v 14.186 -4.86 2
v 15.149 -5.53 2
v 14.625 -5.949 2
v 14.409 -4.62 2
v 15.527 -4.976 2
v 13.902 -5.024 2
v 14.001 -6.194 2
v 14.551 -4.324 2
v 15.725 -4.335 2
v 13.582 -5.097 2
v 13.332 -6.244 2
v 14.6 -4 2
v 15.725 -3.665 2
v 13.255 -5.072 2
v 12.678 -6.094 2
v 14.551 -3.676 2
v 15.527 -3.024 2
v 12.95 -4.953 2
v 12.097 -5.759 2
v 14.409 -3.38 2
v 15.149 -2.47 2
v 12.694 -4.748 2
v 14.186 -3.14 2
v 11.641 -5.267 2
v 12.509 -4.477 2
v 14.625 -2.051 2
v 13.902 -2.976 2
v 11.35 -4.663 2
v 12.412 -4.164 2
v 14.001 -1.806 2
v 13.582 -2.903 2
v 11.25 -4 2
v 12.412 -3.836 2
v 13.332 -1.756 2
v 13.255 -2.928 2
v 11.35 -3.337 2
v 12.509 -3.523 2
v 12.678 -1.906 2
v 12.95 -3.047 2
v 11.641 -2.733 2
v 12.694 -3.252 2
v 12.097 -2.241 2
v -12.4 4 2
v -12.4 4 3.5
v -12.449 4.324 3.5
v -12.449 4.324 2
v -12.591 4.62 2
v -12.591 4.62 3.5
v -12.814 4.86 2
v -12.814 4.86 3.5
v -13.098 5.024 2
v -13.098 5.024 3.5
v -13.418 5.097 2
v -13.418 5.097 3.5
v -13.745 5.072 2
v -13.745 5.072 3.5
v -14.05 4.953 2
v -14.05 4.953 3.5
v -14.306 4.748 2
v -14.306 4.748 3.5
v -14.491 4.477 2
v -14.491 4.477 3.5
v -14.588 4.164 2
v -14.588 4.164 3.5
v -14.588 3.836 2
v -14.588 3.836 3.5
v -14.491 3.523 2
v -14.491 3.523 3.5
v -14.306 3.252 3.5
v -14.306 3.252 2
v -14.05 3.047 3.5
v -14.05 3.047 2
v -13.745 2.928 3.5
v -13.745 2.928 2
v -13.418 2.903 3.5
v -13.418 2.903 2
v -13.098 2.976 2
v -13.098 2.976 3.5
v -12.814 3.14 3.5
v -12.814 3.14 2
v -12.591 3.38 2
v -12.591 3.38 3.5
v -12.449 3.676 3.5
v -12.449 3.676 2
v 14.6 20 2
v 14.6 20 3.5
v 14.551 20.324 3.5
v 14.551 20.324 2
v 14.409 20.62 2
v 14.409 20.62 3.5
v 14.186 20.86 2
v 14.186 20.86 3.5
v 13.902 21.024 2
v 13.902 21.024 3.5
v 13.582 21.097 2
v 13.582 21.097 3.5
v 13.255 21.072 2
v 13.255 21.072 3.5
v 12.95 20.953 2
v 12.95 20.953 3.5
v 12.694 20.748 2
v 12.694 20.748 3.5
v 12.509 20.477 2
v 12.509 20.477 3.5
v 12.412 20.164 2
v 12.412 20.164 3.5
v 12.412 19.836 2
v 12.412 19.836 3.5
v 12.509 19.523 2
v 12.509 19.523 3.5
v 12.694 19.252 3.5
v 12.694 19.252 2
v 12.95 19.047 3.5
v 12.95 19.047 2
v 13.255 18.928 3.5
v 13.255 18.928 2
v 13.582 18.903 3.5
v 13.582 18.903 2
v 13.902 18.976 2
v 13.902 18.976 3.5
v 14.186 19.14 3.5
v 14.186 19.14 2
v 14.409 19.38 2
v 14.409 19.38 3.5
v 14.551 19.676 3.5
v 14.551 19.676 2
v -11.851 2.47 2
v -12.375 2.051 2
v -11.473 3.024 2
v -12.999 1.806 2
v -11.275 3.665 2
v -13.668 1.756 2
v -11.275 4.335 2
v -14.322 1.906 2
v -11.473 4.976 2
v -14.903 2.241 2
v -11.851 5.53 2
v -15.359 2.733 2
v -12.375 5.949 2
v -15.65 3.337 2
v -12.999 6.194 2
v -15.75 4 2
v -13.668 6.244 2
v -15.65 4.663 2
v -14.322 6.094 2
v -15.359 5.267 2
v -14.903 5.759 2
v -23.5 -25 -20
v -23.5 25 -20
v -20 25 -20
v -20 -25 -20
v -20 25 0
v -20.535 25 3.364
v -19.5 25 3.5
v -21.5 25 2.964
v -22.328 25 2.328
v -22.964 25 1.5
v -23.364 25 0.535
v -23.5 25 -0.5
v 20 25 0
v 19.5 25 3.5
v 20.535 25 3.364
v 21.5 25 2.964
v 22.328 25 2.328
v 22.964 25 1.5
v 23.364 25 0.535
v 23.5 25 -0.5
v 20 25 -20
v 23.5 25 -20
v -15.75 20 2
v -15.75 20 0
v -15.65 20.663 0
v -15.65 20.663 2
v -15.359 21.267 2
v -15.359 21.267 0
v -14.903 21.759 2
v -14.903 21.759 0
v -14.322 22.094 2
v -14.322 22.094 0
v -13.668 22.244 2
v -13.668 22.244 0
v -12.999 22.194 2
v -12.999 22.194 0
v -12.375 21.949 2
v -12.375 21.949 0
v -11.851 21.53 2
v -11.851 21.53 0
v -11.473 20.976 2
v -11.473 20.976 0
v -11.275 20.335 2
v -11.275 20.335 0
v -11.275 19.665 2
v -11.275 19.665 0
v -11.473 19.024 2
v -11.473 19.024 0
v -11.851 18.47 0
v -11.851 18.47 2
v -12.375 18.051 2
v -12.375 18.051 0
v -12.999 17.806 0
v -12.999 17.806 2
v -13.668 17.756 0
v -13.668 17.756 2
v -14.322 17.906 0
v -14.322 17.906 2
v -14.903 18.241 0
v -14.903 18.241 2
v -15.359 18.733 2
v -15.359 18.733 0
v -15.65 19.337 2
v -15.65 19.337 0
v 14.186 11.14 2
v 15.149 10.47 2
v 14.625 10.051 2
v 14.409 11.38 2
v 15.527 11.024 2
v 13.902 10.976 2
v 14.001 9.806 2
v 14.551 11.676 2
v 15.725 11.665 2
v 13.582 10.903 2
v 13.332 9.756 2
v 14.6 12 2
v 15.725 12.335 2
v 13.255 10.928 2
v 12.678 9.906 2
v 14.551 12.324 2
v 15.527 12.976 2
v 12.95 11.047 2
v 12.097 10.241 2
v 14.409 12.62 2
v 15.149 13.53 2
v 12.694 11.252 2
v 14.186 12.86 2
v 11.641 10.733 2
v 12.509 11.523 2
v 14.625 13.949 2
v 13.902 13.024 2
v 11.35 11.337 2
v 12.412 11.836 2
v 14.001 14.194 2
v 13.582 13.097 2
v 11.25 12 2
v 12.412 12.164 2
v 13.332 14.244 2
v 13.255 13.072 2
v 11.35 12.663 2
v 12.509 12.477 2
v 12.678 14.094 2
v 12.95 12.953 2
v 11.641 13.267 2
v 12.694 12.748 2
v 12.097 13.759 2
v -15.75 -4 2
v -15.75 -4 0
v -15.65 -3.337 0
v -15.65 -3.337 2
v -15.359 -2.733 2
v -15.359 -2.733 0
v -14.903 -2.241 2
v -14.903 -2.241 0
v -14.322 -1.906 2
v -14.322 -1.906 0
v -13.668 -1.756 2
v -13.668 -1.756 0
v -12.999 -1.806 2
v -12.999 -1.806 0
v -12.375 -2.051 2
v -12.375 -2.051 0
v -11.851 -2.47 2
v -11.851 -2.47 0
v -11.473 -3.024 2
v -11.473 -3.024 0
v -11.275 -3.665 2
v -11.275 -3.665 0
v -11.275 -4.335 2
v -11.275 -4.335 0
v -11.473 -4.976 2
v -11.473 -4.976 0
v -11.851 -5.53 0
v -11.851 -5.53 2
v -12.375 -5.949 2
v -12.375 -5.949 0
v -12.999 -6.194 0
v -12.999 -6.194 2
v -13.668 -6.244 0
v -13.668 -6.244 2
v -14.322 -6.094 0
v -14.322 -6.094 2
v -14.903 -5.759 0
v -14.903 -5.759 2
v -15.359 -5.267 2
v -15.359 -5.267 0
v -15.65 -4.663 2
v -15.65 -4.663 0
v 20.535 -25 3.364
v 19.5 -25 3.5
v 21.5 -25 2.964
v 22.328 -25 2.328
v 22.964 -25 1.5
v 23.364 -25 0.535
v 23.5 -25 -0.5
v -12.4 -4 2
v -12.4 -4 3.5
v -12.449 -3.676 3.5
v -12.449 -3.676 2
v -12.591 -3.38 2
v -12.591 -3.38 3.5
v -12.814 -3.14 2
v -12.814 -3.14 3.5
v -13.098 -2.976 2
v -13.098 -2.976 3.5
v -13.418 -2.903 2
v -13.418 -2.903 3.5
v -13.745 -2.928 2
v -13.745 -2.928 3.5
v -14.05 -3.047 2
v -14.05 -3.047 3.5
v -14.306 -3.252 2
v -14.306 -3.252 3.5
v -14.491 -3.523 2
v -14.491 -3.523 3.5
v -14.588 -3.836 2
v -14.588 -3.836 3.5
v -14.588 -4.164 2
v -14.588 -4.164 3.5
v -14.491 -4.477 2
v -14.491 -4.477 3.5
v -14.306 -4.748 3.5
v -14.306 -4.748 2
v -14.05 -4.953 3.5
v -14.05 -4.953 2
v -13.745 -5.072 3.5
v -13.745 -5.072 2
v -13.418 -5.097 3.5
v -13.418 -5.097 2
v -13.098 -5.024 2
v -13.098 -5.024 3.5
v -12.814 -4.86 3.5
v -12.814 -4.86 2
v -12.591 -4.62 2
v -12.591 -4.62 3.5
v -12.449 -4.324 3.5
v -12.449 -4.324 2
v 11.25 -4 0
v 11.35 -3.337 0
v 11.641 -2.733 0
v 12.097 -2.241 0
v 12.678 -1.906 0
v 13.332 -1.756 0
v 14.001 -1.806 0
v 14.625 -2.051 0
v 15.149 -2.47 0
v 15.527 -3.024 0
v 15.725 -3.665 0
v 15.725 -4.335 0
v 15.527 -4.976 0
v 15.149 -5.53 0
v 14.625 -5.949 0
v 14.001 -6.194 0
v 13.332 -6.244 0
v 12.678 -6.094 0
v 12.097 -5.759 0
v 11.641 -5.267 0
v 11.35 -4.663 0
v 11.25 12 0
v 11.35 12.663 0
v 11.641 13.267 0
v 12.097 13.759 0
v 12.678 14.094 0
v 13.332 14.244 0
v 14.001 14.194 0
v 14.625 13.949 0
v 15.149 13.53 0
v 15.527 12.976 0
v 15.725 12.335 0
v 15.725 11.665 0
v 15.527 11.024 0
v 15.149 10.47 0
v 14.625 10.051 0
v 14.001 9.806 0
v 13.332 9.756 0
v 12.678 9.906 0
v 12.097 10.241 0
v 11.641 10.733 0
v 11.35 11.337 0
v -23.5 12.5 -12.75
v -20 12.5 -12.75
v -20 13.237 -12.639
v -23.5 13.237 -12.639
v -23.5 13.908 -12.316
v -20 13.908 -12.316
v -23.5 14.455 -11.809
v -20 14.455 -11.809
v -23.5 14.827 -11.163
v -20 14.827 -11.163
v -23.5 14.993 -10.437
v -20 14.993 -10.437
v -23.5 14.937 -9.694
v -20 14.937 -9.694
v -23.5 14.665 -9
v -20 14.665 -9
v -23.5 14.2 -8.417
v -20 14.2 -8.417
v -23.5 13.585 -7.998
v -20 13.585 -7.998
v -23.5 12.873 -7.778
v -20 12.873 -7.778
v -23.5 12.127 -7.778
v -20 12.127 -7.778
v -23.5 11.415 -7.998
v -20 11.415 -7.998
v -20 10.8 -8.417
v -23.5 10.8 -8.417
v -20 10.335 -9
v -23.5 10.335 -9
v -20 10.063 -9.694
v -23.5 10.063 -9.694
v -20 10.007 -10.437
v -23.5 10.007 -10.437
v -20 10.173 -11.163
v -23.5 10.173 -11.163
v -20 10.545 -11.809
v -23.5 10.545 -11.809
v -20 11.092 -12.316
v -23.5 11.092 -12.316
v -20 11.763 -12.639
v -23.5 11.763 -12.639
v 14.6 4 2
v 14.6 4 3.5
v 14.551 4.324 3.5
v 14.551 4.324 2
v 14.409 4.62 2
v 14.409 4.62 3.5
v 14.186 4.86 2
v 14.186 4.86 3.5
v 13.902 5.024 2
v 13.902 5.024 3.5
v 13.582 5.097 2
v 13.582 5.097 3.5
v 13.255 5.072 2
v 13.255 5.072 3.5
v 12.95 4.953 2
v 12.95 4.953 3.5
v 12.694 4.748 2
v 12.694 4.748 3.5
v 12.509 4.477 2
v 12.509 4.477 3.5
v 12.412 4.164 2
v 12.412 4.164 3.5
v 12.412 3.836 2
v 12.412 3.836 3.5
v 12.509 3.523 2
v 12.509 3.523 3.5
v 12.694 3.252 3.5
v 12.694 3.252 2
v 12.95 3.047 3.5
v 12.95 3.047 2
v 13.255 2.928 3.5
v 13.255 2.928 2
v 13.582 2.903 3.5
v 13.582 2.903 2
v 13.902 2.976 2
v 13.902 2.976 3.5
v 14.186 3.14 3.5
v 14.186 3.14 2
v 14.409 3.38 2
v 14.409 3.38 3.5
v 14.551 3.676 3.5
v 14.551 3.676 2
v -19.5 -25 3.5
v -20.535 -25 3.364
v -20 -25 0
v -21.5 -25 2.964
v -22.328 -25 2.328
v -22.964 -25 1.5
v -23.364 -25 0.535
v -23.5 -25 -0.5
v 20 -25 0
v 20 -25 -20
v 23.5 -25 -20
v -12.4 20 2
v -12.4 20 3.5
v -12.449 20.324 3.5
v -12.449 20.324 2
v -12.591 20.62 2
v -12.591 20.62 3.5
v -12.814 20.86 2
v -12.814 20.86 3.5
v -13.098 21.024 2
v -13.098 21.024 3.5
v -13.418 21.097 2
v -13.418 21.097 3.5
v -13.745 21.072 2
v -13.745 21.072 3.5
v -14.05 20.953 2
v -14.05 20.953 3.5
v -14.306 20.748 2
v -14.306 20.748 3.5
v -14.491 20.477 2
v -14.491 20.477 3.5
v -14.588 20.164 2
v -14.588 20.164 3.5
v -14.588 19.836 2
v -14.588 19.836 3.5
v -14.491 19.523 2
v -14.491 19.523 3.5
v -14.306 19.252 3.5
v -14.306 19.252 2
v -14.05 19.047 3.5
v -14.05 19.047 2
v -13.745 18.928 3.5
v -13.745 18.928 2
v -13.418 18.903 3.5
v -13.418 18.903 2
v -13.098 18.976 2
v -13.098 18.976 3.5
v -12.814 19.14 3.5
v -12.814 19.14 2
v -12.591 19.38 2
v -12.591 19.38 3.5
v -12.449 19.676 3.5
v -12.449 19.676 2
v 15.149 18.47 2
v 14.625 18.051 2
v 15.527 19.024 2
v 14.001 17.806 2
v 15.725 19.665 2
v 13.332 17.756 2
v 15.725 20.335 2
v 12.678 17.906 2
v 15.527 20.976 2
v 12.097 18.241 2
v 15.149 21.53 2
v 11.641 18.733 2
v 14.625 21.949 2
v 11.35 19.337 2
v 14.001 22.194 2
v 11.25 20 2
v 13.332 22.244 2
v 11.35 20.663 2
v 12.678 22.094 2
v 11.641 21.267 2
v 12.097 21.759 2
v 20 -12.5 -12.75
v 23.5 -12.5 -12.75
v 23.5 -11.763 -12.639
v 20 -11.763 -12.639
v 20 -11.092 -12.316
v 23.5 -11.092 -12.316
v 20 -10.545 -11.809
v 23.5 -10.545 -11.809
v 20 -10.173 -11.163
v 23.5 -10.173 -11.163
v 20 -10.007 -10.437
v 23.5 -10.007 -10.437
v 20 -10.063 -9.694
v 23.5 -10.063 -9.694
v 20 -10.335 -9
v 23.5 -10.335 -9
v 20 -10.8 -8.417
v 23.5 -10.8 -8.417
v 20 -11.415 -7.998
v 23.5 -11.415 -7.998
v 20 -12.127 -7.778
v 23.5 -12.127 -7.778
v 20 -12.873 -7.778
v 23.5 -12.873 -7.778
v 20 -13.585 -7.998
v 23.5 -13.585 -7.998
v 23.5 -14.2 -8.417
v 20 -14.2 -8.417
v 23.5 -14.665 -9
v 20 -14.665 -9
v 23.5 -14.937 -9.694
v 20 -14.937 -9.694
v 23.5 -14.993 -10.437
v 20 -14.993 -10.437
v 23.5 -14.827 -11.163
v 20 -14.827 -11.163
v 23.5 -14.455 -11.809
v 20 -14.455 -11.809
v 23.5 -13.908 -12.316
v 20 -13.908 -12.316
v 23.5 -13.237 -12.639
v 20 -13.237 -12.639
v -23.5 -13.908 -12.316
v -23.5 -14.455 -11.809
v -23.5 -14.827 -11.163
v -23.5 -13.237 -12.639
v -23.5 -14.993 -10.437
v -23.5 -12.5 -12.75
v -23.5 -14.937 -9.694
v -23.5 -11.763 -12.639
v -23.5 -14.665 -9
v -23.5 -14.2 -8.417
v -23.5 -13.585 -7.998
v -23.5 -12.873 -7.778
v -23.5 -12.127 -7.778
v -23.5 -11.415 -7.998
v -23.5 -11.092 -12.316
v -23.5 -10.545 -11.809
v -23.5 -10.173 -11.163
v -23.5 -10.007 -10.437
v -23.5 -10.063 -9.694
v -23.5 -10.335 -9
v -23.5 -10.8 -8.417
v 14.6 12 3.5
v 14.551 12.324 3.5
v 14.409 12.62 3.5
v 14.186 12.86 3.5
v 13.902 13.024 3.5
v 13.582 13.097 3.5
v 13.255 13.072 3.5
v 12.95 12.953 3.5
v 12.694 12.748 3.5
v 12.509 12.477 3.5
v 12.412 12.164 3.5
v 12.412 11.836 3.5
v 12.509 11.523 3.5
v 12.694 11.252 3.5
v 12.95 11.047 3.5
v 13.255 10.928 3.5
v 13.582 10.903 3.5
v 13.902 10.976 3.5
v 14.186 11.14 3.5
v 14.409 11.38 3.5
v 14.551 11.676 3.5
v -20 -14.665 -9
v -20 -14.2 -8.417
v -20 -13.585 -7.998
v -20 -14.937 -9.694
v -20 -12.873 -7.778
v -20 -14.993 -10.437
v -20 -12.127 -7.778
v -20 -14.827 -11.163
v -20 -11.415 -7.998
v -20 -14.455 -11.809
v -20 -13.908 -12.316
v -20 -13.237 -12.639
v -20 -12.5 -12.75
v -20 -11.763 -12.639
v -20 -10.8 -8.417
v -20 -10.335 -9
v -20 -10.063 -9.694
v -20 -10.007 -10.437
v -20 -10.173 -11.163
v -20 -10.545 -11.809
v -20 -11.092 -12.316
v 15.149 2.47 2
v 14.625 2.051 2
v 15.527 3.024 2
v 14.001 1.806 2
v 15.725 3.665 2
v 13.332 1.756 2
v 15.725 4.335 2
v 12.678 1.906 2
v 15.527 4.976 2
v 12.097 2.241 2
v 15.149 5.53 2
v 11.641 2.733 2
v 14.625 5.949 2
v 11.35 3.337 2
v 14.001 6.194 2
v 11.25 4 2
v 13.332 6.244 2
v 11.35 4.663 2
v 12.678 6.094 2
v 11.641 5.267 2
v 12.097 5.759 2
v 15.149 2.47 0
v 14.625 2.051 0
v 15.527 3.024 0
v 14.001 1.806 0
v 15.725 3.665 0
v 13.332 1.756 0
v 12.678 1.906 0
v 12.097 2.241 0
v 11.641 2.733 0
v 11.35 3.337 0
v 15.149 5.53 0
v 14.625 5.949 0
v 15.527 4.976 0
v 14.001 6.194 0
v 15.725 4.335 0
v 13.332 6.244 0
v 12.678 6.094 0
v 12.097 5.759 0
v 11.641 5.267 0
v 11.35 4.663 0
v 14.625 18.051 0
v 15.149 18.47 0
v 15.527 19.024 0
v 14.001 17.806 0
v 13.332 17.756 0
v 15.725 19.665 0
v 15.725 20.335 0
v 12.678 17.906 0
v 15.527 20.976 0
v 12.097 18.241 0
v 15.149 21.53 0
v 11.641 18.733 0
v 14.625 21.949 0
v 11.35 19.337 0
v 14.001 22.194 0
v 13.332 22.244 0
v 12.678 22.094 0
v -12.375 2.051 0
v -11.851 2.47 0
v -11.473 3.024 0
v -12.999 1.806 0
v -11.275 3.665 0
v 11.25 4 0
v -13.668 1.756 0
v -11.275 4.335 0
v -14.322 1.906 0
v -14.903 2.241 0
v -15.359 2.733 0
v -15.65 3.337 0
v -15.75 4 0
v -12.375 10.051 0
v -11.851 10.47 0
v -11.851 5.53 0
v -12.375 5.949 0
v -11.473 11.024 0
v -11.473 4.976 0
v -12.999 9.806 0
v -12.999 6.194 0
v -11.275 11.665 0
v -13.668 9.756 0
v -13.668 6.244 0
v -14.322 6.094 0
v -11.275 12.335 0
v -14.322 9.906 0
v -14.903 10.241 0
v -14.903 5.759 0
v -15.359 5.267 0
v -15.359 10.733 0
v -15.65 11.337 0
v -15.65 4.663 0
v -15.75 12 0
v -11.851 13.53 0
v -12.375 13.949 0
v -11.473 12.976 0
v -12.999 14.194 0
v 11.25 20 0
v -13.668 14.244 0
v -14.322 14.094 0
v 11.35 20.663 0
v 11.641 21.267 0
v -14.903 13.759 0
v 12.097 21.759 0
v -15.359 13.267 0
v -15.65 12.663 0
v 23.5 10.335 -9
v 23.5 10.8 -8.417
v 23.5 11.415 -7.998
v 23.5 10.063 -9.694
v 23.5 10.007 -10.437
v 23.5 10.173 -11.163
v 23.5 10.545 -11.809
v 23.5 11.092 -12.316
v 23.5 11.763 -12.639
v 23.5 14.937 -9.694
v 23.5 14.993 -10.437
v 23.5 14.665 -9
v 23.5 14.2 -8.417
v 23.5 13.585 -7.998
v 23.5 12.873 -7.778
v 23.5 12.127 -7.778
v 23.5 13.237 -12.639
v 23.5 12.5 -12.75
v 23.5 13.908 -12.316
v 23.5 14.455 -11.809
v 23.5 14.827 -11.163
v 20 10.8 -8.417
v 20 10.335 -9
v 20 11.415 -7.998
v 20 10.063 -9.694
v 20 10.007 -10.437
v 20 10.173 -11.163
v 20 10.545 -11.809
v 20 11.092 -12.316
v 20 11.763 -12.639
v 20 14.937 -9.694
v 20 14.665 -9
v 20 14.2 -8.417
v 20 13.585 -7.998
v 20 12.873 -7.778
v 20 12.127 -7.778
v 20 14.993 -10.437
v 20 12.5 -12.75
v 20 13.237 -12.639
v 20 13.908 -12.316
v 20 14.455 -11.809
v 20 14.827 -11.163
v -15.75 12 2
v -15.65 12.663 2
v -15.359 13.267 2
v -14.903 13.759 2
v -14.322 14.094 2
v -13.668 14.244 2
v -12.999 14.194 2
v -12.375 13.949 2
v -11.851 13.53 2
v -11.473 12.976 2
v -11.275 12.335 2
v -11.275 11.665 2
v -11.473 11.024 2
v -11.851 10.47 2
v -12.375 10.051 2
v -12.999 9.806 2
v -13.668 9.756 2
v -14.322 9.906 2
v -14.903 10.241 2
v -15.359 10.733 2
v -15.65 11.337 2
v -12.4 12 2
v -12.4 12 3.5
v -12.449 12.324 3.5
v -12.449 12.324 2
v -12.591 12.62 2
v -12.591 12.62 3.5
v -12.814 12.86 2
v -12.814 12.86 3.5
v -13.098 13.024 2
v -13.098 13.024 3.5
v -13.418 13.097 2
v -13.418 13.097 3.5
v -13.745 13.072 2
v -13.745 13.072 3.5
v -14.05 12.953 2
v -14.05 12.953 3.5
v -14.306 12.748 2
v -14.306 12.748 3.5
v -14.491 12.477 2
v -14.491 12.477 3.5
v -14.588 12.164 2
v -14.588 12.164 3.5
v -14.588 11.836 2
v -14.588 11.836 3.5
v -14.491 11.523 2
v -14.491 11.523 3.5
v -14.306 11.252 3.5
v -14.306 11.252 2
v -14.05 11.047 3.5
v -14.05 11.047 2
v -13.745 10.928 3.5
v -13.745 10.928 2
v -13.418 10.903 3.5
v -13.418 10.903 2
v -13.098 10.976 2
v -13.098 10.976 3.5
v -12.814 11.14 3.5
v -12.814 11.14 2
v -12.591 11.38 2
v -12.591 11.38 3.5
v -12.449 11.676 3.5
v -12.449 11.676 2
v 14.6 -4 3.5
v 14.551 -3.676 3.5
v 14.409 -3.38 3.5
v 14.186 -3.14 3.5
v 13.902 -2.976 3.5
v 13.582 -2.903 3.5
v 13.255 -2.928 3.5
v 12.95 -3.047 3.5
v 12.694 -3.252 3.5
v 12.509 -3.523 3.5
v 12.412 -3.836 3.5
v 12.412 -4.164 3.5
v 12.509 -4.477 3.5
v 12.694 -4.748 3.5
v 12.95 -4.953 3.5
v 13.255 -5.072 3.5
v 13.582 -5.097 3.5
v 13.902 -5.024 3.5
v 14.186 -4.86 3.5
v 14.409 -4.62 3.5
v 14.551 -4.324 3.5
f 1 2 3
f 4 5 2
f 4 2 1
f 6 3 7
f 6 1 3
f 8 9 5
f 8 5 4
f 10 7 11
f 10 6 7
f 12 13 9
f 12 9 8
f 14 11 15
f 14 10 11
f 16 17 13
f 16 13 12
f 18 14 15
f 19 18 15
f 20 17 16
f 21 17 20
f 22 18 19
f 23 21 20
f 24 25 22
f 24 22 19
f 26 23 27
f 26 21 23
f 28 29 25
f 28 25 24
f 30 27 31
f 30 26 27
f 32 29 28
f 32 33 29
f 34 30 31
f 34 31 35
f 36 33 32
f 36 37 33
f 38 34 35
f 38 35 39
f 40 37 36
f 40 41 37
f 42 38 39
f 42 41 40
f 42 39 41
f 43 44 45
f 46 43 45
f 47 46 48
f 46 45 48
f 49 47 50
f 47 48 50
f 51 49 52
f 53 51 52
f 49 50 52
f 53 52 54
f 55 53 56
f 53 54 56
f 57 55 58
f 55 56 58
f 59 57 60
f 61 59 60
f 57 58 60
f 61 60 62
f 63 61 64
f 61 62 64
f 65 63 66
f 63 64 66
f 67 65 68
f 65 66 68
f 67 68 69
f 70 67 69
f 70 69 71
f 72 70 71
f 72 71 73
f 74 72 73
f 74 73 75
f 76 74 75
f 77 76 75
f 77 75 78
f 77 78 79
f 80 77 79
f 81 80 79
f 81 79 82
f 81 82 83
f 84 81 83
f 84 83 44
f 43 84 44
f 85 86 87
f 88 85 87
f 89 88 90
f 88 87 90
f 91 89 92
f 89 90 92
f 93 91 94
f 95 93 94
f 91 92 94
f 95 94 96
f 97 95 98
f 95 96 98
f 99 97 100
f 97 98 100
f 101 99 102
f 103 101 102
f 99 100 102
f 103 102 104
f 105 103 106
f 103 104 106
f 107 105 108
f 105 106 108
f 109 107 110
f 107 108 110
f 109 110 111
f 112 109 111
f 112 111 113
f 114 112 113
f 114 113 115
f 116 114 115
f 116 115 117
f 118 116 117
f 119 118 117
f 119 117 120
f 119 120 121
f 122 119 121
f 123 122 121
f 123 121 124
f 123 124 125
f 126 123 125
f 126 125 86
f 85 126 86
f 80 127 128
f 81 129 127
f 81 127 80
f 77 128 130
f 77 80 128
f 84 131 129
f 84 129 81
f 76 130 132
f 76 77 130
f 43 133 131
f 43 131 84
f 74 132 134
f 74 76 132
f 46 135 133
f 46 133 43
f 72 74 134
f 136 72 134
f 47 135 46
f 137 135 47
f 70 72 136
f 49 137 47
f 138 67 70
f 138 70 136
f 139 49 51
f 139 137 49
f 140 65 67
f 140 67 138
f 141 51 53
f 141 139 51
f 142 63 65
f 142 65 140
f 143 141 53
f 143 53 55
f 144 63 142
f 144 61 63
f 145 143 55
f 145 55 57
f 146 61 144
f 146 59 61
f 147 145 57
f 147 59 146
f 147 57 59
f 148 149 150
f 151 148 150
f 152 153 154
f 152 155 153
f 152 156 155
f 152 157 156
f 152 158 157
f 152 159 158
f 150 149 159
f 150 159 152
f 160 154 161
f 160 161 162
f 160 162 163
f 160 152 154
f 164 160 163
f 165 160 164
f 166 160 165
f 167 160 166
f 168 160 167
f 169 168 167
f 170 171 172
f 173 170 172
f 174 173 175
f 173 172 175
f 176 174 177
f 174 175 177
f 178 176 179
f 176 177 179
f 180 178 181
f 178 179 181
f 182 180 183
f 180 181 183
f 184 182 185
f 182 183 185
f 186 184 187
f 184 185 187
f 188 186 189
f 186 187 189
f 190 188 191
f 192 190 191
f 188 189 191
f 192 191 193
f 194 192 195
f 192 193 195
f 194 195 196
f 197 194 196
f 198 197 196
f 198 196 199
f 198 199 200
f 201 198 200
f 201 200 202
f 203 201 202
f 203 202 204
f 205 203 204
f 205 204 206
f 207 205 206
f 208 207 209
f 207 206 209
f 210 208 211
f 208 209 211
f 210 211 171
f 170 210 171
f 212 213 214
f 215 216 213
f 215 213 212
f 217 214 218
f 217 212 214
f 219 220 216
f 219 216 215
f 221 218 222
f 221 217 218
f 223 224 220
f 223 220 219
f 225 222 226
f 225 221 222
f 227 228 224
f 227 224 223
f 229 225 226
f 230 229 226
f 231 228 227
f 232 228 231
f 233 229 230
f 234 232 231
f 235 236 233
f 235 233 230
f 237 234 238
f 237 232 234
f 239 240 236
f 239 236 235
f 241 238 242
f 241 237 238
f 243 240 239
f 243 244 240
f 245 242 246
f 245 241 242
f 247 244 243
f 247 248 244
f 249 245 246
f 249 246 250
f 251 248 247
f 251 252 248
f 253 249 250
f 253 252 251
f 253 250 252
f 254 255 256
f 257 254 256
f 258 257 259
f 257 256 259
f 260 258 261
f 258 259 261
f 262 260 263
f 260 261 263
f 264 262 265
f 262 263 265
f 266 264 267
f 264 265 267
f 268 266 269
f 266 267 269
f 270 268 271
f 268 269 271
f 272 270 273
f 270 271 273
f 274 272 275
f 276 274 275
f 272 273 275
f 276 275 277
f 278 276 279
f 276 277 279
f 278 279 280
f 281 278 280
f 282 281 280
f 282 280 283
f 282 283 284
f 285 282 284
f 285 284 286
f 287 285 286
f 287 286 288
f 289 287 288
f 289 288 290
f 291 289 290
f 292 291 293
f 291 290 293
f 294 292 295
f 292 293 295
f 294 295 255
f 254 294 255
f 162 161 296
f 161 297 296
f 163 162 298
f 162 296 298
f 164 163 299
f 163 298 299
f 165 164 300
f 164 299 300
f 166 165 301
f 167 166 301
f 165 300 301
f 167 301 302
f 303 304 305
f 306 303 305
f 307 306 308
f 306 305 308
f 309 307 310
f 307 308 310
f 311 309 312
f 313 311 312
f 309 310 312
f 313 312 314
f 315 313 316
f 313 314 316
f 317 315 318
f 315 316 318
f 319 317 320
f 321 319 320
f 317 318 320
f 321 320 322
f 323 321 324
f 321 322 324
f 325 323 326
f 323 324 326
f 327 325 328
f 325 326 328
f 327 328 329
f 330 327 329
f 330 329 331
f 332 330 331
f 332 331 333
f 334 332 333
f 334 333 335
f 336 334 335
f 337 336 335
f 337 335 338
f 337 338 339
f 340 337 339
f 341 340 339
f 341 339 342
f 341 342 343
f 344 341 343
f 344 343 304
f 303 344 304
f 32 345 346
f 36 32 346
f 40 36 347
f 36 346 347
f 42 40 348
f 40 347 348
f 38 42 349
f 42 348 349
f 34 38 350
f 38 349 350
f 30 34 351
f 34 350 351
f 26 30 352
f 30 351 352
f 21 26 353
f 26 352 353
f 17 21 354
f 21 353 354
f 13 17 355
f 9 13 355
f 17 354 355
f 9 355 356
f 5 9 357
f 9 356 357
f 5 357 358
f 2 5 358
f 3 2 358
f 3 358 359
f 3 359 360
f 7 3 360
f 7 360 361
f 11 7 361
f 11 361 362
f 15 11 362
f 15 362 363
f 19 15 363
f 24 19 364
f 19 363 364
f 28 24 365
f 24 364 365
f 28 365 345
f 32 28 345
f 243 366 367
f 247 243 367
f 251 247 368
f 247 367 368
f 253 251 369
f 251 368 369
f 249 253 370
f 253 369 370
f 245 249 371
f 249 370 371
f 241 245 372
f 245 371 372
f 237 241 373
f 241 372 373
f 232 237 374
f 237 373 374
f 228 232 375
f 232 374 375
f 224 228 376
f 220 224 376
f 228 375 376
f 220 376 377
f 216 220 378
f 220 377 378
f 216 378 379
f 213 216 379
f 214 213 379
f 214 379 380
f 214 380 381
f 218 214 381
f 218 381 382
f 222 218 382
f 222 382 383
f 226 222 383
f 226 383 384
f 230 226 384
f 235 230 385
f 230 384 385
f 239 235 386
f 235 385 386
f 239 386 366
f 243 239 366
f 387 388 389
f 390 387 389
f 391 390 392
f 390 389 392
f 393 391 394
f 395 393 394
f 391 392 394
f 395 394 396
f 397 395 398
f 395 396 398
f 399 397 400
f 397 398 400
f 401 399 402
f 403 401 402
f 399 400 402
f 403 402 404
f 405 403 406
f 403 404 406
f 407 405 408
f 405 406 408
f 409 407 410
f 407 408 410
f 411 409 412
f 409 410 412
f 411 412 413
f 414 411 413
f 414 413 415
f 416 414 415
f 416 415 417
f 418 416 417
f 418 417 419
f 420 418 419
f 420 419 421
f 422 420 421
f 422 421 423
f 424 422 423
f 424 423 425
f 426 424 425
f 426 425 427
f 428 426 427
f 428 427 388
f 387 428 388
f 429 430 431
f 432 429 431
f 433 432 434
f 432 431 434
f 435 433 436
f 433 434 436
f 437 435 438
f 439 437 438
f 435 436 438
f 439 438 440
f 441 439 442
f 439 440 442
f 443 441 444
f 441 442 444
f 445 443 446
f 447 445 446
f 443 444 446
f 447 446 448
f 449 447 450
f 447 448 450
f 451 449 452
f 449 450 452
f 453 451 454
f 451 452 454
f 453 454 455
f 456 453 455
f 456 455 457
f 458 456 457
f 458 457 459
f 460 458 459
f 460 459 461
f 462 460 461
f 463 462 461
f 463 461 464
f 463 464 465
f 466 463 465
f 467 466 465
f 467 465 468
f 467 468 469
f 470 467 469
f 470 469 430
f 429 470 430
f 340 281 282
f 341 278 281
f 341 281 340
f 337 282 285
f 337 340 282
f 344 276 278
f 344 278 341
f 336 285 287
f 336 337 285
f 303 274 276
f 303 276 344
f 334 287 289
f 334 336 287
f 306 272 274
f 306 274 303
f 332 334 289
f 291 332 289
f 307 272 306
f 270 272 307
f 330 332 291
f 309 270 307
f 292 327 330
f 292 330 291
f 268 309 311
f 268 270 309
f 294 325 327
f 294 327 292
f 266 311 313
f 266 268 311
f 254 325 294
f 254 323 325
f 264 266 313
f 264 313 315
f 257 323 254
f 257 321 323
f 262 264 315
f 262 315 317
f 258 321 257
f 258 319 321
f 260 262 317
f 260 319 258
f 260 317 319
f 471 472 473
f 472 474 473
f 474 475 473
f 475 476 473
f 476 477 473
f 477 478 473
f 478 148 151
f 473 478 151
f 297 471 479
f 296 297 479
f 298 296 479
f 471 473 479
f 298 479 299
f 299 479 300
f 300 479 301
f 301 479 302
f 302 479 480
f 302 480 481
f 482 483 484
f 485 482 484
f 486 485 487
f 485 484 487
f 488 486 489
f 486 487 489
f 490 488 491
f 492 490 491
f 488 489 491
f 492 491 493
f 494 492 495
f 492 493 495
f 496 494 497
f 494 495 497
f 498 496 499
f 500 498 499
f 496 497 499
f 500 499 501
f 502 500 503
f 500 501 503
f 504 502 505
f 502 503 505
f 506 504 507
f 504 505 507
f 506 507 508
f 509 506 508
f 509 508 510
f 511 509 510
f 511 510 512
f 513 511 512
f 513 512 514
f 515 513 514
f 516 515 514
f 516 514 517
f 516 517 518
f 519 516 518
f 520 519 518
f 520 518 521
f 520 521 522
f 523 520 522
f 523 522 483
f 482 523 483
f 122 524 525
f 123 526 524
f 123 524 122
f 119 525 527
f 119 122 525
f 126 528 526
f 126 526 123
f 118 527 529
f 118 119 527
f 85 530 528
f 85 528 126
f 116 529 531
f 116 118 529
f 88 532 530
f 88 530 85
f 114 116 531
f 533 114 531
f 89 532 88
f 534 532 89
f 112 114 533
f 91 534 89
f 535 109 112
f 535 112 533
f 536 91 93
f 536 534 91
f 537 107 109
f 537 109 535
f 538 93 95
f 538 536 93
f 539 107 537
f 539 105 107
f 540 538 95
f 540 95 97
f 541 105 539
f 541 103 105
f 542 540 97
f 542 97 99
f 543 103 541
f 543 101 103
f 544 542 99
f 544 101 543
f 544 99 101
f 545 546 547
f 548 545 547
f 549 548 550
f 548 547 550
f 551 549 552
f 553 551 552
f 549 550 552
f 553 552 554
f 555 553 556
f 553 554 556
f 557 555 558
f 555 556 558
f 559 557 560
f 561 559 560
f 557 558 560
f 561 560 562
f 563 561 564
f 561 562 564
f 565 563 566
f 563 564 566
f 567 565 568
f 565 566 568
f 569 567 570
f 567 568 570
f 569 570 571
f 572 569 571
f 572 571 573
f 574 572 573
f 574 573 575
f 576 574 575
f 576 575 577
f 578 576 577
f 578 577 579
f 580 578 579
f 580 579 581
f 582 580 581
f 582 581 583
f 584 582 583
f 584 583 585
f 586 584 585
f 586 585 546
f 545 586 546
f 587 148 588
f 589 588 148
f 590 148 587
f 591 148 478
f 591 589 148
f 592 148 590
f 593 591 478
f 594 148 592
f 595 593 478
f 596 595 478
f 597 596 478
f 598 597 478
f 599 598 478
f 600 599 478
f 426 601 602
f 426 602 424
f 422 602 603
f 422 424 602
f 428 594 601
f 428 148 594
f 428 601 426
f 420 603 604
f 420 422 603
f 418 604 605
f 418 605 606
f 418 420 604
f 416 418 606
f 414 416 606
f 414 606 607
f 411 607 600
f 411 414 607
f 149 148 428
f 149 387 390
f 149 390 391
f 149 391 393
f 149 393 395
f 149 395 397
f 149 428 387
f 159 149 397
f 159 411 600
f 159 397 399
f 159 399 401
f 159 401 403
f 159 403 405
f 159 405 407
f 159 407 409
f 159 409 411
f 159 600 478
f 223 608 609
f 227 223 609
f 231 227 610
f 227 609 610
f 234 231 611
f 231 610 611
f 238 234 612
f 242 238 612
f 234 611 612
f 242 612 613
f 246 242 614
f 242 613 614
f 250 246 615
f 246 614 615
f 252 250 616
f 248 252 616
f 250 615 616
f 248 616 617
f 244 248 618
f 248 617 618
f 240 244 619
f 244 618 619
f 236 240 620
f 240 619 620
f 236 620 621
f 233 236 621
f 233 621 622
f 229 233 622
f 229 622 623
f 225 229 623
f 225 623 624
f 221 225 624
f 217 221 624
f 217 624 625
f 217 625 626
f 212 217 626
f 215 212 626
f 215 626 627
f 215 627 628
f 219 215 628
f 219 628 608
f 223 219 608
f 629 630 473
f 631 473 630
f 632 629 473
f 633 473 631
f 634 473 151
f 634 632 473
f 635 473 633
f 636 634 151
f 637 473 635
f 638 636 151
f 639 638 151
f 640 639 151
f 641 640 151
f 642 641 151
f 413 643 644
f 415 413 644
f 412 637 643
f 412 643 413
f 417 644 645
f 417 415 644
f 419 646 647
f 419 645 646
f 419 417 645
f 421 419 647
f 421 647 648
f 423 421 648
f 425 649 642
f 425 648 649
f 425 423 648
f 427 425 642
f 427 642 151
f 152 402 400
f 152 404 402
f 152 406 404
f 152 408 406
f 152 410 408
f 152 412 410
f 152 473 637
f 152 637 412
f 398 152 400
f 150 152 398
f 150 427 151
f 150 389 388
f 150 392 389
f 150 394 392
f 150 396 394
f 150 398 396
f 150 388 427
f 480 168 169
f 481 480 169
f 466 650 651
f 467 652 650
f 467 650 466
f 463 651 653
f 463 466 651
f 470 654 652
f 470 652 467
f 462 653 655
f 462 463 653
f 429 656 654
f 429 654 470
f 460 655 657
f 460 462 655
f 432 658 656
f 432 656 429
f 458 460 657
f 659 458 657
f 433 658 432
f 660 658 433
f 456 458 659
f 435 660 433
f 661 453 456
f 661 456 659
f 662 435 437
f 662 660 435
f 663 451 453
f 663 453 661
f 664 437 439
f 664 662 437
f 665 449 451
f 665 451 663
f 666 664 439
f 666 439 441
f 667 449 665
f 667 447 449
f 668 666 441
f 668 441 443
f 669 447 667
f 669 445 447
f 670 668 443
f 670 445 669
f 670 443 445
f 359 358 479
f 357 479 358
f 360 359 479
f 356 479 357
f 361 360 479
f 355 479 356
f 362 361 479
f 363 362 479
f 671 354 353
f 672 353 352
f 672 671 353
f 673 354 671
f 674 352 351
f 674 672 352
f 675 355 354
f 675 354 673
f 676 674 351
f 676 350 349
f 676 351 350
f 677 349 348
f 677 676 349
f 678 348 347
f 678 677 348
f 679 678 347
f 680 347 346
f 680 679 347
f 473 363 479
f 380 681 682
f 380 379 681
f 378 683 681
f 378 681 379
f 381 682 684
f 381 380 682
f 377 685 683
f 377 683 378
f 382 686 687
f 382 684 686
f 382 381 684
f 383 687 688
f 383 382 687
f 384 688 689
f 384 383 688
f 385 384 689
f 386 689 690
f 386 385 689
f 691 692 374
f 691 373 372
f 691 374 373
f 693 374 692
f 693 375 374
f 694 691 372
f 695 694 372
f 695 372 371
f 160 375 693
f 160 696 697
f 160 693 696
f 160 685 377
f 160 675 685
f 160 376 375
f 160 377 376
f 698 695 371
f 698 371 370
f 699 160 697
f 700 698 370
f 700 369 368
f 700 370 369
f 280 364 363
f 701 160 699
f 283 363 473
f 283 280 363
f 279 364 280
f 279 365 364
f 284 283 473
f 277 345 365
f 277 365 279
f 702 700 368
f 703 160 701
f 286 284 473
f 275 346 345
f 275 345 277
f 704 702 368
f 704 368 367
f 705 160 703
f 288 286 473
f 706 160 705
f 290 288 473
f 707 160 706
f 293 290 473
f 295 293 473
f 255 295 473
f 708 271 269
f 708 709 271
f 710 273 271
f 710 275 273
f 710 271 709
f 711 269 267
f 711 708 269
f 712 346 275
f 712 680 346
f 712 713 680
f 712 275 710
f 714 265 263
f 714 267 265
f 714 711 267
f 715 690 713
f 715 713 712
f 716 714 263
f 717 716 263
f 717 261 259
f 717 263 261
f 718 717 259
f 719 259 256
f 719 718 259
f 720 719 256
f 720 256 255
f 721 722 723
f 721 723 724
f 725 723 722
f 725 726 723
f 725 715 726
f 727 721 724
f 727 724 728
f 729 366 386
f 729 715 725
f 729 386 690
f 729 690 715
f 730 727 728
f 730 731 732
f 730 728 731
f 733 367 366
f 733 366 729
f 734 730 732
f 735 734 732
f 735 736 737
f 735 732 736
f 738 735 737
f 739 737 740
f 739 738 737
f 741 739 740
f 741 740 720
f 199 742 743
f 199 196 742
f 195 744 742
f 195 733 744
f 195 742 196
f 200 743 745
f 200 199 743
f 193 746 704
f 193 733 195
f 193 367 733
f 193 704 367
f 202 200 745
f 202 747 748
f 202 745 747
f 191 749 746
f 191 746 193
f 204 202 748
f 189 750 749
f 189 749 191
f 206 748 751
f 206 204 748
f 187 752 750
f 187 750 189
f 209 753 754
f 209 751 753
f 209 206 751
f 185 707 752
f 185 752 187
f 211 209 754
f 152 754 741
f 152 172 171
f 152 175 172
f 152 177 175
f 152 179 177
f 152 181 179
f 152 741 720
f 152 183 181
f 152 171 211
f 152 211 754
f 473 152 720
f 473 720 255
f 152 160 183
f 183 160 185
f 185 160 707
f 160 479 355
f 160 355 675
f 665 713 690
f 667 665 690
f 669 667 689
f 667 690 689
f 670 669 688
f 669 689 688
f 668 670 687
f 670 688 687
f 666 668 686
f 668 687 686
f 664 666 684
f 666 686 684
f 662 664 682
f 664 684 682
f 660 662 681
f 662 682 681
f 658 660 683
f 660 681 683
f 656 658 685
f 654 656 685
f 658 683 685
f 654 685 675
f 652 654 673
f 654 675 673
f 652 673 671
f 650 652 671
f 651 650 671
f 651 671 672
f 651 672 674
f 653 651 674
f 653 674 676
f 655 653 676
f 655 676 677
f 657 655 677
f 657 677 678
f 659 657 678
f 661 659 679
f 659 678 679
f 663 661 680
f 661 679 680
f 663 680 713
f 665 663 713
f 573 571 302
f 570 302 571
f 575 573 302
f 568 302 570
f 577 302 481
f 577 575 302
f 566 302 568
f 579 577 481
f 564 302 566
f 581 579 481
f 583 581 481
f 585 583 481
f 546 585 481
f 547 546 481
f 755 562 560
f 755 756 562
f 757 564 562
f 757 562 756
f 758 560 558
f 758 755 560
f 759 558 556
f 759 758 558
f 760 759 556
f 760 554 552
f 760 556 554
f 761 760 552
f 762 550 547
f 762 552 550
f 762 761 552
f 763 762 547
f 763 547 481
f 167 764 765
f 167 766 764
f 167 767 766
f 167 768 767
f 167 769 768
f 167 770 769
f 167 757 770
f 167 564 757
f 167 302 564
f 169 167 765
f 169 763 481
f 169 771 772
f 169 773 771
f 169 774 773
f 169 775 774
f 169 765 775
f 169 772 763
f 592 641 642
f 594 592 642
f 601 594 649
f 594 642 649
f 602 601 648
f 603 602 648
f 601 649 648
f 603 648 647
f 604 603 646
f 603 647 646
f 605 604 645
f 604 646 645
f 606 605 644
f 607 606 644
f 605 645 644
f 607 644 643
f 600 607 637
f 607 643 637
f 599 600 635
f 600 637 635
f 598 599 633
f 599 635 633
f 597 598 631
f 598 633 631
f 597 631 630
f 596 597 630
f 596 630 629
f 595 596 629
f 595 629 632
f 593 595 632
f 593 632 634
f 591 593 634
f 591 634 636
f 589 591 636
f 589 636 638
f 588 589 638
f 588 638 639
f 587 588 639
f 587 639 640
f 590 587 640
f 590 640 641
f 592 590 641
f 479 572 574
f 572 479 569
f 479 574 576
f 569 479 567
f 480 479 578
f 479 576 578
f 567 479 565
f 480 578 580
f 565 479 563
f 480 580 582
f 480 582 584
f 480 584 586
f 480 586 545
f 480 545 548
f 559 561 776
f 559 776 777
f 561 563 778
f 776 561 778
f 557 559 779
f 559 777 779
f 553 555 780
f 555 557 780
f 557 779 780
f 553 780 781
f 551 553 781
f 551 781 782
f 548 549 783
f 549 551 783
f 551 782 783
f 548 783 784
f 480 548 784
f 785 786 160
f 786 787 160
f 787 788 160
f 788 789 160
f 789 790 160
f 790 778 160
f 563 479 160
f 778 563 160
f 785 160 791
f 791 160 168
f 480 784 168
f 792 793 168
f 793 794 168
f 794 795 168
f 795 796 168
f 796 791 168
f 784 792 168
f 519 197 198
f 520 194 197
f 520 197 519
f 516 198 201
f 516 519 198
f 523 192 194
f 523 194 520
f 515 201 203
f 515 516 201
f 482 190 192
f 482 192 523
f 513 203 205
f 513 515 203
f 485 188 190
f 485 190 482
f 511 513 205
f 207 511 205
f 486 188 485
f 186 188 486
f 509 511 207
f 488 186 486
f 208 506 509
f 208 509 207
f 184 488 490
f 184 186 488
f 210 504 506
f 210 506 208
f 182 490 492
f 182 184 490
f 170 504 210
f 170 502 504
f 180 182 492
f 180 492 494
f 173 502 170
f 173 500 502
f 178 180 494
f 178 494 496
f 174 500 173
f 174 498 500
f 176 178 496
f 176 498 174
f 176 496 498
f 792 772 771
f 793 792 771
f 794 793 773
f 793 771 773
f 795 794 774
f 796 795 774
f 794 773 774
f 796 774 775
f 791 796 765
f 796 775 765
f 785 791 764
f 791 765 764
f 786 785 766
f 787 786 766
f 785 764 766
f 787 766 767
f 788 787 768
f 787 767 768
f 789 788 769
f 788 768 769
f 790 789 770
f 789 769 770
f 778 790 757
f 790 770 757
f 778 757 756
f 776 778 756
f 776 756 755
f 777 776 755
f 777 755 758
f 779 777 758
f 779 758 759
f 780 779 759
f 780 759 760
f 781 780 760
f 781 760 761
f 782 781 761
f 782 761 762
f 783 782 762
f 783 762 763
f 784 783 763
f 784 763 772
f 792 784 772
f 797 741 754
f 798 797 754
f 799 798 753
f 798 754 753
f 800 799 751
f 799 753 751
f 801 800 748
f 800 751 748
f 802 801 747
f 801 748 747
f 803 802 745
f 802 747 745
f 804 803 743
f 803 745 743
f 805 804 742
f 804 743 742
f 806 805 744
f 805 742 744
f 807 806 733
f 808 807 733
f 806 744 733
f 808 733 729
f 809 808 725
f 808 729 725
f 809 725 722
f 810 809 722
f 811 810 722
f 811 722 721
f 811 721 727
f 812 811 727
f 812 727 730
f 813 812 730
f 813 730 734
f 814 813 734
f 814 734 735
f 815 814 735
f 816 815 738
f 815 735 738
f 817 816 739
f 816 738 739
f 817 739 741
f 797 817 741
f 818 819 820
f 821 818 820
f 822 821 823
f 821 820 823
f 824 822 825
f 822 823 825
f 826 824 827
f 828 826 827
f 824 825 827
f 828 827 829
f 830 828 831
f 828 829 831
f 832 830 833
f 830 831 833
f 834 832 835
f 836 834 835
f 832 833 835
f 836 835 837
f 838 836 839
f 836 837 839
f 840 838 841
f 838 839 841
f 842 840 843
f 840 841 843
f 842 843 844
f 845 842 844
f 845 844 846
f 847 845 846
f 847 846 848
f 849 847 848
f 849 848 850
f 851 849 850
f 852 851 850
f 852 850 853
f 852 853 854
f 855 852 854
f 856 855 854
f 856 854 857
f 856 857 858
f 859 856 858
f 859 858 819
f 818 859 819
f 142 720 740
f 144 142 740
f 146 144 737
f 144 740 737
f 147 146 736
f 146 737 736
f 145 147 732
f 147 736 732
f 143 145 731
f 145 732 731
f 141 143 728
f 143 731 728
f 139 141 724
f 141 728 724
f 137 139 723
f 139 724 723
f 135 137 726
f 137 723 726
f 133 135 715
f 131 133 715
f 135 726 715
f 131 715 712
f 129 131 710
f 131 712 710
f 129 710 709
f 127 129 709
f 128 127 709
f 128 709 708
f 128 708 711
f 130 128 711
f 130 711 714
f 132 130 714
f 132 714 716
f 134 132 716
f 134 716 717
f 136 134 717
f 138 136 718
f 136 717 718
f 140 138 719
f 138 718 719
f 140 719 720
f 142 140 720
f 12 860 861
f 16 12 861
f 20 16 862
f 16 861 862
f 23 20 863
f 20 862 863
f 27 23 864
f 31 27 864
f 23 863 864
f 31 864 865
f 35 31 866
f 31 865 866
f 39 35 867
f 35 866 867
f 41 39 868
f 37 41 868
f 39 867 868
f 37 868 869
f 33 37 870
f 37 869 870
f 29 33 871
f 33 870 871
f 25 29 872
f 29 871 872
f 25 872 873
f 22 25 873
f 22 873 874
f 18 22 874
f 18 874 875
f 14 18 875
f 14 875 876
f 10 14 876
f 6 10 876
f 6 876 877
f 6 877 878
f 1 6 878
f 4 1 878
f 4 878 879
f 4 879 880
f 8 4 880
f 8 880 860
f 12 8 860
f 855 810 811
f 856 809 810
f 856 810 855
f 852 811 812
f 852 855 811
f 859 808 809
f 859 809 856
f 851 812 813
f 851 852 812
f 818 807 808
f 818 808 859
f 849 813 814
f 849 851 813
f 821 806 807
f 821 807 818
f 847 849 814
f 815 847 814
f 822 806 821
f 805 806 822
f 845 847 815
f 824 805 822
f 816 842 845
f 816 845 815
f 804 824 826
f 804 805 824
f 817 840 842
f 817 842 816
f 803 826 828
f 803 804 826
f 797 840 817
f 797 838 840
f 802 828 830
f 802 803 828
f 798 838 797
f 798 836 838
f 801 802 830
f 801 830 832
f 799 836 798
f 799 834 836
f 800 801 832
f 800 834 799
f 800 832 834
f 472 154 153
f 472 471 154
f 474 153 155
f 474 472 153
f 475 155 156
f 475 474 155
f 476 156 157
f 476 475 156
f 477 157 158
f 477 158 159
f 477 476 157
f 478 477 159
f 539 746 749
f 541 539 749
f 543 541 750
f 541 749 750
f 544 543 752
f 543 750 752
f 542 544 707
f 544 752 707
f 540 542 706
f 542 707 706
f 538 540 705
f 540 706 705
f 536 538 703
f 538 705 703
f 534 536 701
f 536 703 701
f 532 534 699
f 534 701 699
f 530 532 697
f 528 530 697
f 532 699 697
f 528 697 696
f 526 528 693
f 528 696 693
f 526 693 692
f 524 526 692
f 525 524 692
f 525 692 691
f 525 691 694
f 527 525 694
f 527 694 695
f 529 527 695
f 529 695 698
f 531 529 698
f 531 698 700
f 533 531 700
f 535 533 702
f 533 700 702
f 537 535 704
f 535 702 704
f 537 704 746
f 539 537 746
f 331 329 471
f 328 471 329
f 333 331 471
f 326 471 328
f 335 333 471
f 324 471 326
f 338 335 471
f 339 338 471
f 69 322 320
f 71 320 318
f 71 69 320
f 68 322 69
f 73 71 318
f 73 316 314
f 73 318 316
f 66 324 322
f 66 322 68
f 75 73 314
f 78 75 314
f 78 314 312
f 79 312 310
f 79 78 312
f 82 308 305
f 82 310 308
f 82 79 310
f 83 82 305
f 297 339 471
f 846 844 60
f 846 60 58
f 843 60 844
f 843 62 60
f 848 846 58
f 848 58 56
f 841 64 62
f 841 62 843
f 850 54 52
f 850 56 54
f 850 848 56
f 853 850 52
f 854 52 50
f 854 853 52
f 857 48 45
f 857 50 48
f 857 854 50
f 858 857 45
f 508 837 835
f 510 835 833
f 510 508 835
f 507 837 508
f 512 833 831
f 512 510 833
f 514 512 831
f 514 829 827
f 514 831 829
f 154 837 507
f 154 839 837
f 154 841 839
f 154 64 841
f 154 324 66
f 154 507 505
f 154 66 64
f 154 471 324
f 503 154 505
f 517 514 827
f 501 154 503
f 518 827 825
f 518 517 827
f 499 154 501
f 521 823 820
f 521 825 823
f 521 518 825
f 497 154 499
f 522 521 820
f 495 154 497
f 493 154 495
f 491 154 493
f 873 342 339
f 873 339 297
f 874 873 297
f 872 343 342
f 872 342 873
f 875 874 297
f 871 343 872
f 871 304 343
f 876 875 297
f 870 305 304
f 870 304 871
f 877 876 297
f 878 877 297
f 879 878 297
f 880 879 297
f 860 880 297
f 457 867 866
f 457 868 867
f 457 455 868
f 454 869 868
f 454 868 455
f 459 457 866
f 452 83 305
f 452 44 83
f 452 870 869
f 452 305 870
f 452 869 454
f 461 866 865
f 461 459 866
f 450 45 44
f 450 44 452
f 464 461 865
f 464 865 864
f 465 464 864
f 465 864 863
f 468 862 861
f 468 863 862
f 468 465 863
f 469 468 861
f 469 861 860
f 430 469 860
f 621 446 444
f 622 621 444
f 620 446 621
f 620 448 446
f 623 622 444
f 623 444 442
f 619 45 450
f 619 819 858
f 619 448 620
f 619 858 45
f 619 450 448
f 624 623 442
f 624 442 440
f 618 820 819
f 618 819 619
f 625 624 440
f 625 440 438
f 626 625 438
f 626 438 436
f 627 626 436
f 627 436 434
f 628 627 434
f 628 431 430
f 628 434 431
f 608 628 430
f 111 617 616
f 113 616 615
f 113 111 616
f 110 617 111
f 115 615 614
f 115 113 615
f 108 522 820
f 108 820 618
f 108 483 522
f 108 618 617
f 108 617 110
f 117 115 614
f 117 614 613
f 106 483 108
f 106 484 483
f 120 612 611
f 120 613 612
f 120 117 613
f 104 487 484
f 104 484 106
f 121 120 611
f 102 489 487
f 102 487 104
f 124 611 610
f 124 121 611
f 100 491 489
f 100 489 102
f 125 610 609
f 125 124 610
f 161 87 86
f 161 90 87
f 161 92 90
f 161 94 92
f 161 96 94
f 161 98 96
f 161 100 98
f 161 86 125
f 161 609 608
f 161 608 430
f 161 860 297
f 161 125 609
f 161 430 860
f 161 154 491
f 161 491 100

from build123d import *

# Parameters (mm, degrees)
CROQUIS1_W              = 36
CROQUIS1_H              = 50
SALIENTE_EXTRUIR1_DEPTH = 3.5
CROQUIS2_R              = 1.1
CORTAR_EXTRUIR2_DEPTH   = 5
CROQUIS5_W              = 3.5
CROQUIS5_H              = 20
CROQUIS5_W_2            = 5.5
CROQUIS5_H_2            = 3.5
SALIENTE_EXTRUIR3_DEPTH = 50
REDONDEO1_R             = 4
CROQUIS6_R              = 2.25
CORTAR_EXTRUIR3_DEPTH   = 2
CROQUIS8_R              = 2.5
CORTAR_EXTRUIR4_DEPTH   = 57.868268832


with BuildPart() as part:
    # Croquis1 → Saliente-Extruir1 (new body)
    with BuildSketch(Plane.XY):
        Rectangle(CROQUIS1_W, CROQUIS1_H)
    extrude(amount=SALIENTE_EXTRUIR1_DEPTH)

    # Croquis2 → Cortar-Extruir2 (cut)
    with BuildSketch(Plane.XY.offset(3.5)):
        with Locations((-13.5, 20)):
            Circle(CROQUIS2_R)
        with Locations((13.5, 20)):
            Circle(CROQUIS2_R)
        with Locations((13.5, 12)):
            Circle(CROQUIS2_R)
        with Locations((13.5, 4)):
            Circle(CROQUIS2_R)
        with Locations((13.5, -4)):
            Circle(CROQUIS2_R)
        with Locations((-13.5, 12)):
            Circle(CROQUIS2_R)
        with Locations((-13.5, 4)):
            Circle(CROQUIS2_R)
        with Locations((-13.5, -4)):
            Circle(CROQUIS2_R)
    extrude(amount=-CORTAR_EXTRUIR2_DEPTH, mode=Mode.SUBTRACT)

    # Croquis5 → Saliente-Extruir3 (add, through all)
    with BuildSketch(Plane(origin=(0, 25, 0), x_dir=(1, 0, 0), z_dir=(0, 1, 0))):
        Polygon((-18, 0), (-20, 0), (-23.5, 0), (-23.5, -3.5), (-18, -3.5), align=None)
        with Locations((-21.75, 10)):
            Rectangle(CROQUIS5_W, CROQUIS5_H)
        with Locations((20.75, -1.75)):
            Rectangle(CROQUIS5_W_2, CROQUIS5_H_2)
        with Locations((21.75, 10)):
            Rectangle(CROQUIS5_W, CROQUIS5_H)
    extrude(amount=-SALIENTE_EXTRUIR3_DEPTH)

    # Redondeo1
    redondeo1_edges = [part.edges().sort_by_distance(p)[0] for p in [
        (-23.5, 0, 3.5),
        (23.5, 0, 3.5),
    ]]
    fillet(redondeo1_edges, radius=REDONDEO1_R)

    # Croquis6 → Cortar-Extruir3 (cut)
    with BuildSketch(Plane(origin=(0, 0, 0), x_dir=(-1, 0, 0), z_dir=(0, 0, -1))):
        with Locations((-13.5, 20)):
            Circle(CROQUIS6_R)
        with Locations((13.5, 20)):
            Circle(CROQUIS6_R)
        with Locations((13.5, 12)):
            Circle(CROQUIS6_R)
        with Locations((13.5, 4)):
            Circle(CROQUIS6_R)
        with Locations((13.5, -4)):
            Circle(CROQUIS6_R)
        with Locations((-13.5, 12)):
            Circle(CROQUIS6_R)
        with Locations((-13.5, 4)):
            Circle(CROQUIS6_R)
        with Locations((-13.5, -4)):
            Circle(CROQUIS6_R)
    extrude(amount=-CORTAR_EXTRUIR3_DEPTH, mode=Mode.SUBTRACT)

    # Croquis8 → Cortar-Extruir4 (cut, through all)
    with BuildSketch(Plane(origin=(23.5, 0, 0), x_dir=(0, 0, -1), z_dir=(1, 0, 0))):
        with Locations((10.25, 12.5)):
            Circle(CROQUIS8_R)
        with Locations((10.25, -12.5)):
            Circle(CROQUIS8_R)
    extrude(amount=-CORTAR_EXTRUIR4_DEPTH, mode=Mode.SUBTRACT)


solid = part.part
